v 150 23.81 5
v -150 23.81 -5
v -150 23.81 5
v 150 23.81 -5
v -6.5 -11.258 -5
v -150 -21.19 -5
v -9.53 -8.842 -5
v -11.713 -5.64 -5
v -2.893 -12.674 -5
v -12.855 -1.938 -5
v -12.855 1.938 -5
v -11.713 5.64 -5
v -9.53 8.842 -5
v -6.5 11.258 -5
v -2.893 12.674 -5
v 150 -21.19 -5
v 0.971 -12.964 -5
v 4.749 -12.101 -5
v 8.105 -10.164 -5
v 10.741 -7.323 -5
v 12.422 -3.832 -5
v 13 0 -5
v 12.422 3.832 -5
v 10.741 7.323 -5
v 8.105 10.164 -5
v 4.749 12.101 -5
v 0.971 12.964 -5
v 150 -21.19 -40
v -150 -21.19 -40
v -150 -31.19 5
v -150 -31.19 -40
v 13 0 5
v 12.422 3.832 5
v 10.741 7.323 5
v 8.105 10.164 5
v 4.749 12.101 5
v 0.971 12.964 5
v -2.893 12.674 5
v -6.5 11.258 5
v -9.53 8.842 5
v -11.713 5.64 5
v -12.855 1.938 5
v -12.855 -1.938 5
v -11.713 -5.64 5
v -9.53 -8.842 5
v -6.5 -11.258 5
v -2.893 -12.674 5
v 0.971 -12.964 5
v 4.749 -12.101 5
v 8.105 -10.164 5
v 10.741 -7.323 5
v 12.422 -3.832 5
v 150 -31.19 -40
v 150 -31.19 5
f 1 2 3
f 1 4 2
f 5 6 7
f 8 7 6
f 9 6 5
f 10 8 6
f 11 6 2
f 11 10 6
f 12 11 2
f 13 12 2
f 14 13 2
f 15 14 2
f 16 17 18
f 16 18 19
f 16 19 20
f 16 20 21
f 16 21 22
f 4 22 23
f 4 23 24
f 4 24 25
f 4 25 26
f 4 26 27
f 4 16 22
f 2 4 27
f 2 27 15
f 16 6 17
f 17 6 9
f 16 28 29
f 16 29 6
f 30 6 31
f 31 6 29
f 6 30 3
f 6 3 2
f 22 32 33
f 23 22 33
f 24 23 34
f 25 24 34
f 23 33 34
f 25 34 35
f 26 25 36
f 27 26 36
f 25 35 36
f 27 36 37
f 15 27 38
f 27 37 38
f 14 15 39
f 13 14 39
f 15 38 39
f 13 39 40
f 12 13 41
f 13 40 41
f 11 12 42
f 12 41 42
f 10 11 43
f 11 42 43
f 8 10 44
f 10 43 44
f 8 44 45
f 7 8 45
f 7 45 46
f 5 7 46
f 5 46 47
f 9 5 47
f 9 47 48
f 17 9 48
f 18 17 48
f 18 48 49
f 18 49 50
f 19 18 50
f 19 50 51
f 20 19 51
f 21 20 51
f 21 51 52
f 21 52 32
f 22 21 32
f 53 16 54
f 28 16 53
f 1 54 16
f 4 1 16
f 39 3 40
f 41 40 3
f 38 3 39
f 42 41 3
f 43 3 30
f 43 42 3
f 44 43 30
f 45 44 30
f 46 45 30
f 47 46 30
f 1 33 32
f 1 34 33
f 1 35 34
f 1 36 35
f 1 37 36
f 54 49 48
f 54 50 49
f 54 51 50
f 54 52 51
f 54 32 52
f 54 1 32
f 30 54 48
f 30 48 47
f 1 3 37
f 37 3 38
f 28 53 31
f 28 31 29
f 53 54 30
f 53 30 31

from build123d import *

# Parameters (mm, degrees)
EXTRUDE_THIN1_DEPTH = 150
SKETCH2_R           = 13
CUT_EXTRUDE1_DEPTH  = 46


with BuildPart() as part:
    # Sketch1 → Extrude-Thin1 (new body, symmetric)
    with BuildSketch(Plane(origin=(0, 0, 0), x_dir=(0, 0, -1), z_dir=(1, 0, 0))):
        Polygon((-5, 23.80952381), (-5, -31.19047619), (40, -31.19047619), (40, -21.19047619), (5, -21.19047619), (5, 23.80952381), align=None)
    extrude(amount=EXTRUDE_THIN1_DEPTH, both=True)

    # Sketch2 → Cut-Extrude1 (cut, through all)
    with BuildSketch(Plane.XY.offset(5)):
        Circle(SKETCH2_R)
    extrude(amount=-CUT_EXTRUDE1_DEPTH, mode=Mode.SUBTRACT)


solid = part.part
